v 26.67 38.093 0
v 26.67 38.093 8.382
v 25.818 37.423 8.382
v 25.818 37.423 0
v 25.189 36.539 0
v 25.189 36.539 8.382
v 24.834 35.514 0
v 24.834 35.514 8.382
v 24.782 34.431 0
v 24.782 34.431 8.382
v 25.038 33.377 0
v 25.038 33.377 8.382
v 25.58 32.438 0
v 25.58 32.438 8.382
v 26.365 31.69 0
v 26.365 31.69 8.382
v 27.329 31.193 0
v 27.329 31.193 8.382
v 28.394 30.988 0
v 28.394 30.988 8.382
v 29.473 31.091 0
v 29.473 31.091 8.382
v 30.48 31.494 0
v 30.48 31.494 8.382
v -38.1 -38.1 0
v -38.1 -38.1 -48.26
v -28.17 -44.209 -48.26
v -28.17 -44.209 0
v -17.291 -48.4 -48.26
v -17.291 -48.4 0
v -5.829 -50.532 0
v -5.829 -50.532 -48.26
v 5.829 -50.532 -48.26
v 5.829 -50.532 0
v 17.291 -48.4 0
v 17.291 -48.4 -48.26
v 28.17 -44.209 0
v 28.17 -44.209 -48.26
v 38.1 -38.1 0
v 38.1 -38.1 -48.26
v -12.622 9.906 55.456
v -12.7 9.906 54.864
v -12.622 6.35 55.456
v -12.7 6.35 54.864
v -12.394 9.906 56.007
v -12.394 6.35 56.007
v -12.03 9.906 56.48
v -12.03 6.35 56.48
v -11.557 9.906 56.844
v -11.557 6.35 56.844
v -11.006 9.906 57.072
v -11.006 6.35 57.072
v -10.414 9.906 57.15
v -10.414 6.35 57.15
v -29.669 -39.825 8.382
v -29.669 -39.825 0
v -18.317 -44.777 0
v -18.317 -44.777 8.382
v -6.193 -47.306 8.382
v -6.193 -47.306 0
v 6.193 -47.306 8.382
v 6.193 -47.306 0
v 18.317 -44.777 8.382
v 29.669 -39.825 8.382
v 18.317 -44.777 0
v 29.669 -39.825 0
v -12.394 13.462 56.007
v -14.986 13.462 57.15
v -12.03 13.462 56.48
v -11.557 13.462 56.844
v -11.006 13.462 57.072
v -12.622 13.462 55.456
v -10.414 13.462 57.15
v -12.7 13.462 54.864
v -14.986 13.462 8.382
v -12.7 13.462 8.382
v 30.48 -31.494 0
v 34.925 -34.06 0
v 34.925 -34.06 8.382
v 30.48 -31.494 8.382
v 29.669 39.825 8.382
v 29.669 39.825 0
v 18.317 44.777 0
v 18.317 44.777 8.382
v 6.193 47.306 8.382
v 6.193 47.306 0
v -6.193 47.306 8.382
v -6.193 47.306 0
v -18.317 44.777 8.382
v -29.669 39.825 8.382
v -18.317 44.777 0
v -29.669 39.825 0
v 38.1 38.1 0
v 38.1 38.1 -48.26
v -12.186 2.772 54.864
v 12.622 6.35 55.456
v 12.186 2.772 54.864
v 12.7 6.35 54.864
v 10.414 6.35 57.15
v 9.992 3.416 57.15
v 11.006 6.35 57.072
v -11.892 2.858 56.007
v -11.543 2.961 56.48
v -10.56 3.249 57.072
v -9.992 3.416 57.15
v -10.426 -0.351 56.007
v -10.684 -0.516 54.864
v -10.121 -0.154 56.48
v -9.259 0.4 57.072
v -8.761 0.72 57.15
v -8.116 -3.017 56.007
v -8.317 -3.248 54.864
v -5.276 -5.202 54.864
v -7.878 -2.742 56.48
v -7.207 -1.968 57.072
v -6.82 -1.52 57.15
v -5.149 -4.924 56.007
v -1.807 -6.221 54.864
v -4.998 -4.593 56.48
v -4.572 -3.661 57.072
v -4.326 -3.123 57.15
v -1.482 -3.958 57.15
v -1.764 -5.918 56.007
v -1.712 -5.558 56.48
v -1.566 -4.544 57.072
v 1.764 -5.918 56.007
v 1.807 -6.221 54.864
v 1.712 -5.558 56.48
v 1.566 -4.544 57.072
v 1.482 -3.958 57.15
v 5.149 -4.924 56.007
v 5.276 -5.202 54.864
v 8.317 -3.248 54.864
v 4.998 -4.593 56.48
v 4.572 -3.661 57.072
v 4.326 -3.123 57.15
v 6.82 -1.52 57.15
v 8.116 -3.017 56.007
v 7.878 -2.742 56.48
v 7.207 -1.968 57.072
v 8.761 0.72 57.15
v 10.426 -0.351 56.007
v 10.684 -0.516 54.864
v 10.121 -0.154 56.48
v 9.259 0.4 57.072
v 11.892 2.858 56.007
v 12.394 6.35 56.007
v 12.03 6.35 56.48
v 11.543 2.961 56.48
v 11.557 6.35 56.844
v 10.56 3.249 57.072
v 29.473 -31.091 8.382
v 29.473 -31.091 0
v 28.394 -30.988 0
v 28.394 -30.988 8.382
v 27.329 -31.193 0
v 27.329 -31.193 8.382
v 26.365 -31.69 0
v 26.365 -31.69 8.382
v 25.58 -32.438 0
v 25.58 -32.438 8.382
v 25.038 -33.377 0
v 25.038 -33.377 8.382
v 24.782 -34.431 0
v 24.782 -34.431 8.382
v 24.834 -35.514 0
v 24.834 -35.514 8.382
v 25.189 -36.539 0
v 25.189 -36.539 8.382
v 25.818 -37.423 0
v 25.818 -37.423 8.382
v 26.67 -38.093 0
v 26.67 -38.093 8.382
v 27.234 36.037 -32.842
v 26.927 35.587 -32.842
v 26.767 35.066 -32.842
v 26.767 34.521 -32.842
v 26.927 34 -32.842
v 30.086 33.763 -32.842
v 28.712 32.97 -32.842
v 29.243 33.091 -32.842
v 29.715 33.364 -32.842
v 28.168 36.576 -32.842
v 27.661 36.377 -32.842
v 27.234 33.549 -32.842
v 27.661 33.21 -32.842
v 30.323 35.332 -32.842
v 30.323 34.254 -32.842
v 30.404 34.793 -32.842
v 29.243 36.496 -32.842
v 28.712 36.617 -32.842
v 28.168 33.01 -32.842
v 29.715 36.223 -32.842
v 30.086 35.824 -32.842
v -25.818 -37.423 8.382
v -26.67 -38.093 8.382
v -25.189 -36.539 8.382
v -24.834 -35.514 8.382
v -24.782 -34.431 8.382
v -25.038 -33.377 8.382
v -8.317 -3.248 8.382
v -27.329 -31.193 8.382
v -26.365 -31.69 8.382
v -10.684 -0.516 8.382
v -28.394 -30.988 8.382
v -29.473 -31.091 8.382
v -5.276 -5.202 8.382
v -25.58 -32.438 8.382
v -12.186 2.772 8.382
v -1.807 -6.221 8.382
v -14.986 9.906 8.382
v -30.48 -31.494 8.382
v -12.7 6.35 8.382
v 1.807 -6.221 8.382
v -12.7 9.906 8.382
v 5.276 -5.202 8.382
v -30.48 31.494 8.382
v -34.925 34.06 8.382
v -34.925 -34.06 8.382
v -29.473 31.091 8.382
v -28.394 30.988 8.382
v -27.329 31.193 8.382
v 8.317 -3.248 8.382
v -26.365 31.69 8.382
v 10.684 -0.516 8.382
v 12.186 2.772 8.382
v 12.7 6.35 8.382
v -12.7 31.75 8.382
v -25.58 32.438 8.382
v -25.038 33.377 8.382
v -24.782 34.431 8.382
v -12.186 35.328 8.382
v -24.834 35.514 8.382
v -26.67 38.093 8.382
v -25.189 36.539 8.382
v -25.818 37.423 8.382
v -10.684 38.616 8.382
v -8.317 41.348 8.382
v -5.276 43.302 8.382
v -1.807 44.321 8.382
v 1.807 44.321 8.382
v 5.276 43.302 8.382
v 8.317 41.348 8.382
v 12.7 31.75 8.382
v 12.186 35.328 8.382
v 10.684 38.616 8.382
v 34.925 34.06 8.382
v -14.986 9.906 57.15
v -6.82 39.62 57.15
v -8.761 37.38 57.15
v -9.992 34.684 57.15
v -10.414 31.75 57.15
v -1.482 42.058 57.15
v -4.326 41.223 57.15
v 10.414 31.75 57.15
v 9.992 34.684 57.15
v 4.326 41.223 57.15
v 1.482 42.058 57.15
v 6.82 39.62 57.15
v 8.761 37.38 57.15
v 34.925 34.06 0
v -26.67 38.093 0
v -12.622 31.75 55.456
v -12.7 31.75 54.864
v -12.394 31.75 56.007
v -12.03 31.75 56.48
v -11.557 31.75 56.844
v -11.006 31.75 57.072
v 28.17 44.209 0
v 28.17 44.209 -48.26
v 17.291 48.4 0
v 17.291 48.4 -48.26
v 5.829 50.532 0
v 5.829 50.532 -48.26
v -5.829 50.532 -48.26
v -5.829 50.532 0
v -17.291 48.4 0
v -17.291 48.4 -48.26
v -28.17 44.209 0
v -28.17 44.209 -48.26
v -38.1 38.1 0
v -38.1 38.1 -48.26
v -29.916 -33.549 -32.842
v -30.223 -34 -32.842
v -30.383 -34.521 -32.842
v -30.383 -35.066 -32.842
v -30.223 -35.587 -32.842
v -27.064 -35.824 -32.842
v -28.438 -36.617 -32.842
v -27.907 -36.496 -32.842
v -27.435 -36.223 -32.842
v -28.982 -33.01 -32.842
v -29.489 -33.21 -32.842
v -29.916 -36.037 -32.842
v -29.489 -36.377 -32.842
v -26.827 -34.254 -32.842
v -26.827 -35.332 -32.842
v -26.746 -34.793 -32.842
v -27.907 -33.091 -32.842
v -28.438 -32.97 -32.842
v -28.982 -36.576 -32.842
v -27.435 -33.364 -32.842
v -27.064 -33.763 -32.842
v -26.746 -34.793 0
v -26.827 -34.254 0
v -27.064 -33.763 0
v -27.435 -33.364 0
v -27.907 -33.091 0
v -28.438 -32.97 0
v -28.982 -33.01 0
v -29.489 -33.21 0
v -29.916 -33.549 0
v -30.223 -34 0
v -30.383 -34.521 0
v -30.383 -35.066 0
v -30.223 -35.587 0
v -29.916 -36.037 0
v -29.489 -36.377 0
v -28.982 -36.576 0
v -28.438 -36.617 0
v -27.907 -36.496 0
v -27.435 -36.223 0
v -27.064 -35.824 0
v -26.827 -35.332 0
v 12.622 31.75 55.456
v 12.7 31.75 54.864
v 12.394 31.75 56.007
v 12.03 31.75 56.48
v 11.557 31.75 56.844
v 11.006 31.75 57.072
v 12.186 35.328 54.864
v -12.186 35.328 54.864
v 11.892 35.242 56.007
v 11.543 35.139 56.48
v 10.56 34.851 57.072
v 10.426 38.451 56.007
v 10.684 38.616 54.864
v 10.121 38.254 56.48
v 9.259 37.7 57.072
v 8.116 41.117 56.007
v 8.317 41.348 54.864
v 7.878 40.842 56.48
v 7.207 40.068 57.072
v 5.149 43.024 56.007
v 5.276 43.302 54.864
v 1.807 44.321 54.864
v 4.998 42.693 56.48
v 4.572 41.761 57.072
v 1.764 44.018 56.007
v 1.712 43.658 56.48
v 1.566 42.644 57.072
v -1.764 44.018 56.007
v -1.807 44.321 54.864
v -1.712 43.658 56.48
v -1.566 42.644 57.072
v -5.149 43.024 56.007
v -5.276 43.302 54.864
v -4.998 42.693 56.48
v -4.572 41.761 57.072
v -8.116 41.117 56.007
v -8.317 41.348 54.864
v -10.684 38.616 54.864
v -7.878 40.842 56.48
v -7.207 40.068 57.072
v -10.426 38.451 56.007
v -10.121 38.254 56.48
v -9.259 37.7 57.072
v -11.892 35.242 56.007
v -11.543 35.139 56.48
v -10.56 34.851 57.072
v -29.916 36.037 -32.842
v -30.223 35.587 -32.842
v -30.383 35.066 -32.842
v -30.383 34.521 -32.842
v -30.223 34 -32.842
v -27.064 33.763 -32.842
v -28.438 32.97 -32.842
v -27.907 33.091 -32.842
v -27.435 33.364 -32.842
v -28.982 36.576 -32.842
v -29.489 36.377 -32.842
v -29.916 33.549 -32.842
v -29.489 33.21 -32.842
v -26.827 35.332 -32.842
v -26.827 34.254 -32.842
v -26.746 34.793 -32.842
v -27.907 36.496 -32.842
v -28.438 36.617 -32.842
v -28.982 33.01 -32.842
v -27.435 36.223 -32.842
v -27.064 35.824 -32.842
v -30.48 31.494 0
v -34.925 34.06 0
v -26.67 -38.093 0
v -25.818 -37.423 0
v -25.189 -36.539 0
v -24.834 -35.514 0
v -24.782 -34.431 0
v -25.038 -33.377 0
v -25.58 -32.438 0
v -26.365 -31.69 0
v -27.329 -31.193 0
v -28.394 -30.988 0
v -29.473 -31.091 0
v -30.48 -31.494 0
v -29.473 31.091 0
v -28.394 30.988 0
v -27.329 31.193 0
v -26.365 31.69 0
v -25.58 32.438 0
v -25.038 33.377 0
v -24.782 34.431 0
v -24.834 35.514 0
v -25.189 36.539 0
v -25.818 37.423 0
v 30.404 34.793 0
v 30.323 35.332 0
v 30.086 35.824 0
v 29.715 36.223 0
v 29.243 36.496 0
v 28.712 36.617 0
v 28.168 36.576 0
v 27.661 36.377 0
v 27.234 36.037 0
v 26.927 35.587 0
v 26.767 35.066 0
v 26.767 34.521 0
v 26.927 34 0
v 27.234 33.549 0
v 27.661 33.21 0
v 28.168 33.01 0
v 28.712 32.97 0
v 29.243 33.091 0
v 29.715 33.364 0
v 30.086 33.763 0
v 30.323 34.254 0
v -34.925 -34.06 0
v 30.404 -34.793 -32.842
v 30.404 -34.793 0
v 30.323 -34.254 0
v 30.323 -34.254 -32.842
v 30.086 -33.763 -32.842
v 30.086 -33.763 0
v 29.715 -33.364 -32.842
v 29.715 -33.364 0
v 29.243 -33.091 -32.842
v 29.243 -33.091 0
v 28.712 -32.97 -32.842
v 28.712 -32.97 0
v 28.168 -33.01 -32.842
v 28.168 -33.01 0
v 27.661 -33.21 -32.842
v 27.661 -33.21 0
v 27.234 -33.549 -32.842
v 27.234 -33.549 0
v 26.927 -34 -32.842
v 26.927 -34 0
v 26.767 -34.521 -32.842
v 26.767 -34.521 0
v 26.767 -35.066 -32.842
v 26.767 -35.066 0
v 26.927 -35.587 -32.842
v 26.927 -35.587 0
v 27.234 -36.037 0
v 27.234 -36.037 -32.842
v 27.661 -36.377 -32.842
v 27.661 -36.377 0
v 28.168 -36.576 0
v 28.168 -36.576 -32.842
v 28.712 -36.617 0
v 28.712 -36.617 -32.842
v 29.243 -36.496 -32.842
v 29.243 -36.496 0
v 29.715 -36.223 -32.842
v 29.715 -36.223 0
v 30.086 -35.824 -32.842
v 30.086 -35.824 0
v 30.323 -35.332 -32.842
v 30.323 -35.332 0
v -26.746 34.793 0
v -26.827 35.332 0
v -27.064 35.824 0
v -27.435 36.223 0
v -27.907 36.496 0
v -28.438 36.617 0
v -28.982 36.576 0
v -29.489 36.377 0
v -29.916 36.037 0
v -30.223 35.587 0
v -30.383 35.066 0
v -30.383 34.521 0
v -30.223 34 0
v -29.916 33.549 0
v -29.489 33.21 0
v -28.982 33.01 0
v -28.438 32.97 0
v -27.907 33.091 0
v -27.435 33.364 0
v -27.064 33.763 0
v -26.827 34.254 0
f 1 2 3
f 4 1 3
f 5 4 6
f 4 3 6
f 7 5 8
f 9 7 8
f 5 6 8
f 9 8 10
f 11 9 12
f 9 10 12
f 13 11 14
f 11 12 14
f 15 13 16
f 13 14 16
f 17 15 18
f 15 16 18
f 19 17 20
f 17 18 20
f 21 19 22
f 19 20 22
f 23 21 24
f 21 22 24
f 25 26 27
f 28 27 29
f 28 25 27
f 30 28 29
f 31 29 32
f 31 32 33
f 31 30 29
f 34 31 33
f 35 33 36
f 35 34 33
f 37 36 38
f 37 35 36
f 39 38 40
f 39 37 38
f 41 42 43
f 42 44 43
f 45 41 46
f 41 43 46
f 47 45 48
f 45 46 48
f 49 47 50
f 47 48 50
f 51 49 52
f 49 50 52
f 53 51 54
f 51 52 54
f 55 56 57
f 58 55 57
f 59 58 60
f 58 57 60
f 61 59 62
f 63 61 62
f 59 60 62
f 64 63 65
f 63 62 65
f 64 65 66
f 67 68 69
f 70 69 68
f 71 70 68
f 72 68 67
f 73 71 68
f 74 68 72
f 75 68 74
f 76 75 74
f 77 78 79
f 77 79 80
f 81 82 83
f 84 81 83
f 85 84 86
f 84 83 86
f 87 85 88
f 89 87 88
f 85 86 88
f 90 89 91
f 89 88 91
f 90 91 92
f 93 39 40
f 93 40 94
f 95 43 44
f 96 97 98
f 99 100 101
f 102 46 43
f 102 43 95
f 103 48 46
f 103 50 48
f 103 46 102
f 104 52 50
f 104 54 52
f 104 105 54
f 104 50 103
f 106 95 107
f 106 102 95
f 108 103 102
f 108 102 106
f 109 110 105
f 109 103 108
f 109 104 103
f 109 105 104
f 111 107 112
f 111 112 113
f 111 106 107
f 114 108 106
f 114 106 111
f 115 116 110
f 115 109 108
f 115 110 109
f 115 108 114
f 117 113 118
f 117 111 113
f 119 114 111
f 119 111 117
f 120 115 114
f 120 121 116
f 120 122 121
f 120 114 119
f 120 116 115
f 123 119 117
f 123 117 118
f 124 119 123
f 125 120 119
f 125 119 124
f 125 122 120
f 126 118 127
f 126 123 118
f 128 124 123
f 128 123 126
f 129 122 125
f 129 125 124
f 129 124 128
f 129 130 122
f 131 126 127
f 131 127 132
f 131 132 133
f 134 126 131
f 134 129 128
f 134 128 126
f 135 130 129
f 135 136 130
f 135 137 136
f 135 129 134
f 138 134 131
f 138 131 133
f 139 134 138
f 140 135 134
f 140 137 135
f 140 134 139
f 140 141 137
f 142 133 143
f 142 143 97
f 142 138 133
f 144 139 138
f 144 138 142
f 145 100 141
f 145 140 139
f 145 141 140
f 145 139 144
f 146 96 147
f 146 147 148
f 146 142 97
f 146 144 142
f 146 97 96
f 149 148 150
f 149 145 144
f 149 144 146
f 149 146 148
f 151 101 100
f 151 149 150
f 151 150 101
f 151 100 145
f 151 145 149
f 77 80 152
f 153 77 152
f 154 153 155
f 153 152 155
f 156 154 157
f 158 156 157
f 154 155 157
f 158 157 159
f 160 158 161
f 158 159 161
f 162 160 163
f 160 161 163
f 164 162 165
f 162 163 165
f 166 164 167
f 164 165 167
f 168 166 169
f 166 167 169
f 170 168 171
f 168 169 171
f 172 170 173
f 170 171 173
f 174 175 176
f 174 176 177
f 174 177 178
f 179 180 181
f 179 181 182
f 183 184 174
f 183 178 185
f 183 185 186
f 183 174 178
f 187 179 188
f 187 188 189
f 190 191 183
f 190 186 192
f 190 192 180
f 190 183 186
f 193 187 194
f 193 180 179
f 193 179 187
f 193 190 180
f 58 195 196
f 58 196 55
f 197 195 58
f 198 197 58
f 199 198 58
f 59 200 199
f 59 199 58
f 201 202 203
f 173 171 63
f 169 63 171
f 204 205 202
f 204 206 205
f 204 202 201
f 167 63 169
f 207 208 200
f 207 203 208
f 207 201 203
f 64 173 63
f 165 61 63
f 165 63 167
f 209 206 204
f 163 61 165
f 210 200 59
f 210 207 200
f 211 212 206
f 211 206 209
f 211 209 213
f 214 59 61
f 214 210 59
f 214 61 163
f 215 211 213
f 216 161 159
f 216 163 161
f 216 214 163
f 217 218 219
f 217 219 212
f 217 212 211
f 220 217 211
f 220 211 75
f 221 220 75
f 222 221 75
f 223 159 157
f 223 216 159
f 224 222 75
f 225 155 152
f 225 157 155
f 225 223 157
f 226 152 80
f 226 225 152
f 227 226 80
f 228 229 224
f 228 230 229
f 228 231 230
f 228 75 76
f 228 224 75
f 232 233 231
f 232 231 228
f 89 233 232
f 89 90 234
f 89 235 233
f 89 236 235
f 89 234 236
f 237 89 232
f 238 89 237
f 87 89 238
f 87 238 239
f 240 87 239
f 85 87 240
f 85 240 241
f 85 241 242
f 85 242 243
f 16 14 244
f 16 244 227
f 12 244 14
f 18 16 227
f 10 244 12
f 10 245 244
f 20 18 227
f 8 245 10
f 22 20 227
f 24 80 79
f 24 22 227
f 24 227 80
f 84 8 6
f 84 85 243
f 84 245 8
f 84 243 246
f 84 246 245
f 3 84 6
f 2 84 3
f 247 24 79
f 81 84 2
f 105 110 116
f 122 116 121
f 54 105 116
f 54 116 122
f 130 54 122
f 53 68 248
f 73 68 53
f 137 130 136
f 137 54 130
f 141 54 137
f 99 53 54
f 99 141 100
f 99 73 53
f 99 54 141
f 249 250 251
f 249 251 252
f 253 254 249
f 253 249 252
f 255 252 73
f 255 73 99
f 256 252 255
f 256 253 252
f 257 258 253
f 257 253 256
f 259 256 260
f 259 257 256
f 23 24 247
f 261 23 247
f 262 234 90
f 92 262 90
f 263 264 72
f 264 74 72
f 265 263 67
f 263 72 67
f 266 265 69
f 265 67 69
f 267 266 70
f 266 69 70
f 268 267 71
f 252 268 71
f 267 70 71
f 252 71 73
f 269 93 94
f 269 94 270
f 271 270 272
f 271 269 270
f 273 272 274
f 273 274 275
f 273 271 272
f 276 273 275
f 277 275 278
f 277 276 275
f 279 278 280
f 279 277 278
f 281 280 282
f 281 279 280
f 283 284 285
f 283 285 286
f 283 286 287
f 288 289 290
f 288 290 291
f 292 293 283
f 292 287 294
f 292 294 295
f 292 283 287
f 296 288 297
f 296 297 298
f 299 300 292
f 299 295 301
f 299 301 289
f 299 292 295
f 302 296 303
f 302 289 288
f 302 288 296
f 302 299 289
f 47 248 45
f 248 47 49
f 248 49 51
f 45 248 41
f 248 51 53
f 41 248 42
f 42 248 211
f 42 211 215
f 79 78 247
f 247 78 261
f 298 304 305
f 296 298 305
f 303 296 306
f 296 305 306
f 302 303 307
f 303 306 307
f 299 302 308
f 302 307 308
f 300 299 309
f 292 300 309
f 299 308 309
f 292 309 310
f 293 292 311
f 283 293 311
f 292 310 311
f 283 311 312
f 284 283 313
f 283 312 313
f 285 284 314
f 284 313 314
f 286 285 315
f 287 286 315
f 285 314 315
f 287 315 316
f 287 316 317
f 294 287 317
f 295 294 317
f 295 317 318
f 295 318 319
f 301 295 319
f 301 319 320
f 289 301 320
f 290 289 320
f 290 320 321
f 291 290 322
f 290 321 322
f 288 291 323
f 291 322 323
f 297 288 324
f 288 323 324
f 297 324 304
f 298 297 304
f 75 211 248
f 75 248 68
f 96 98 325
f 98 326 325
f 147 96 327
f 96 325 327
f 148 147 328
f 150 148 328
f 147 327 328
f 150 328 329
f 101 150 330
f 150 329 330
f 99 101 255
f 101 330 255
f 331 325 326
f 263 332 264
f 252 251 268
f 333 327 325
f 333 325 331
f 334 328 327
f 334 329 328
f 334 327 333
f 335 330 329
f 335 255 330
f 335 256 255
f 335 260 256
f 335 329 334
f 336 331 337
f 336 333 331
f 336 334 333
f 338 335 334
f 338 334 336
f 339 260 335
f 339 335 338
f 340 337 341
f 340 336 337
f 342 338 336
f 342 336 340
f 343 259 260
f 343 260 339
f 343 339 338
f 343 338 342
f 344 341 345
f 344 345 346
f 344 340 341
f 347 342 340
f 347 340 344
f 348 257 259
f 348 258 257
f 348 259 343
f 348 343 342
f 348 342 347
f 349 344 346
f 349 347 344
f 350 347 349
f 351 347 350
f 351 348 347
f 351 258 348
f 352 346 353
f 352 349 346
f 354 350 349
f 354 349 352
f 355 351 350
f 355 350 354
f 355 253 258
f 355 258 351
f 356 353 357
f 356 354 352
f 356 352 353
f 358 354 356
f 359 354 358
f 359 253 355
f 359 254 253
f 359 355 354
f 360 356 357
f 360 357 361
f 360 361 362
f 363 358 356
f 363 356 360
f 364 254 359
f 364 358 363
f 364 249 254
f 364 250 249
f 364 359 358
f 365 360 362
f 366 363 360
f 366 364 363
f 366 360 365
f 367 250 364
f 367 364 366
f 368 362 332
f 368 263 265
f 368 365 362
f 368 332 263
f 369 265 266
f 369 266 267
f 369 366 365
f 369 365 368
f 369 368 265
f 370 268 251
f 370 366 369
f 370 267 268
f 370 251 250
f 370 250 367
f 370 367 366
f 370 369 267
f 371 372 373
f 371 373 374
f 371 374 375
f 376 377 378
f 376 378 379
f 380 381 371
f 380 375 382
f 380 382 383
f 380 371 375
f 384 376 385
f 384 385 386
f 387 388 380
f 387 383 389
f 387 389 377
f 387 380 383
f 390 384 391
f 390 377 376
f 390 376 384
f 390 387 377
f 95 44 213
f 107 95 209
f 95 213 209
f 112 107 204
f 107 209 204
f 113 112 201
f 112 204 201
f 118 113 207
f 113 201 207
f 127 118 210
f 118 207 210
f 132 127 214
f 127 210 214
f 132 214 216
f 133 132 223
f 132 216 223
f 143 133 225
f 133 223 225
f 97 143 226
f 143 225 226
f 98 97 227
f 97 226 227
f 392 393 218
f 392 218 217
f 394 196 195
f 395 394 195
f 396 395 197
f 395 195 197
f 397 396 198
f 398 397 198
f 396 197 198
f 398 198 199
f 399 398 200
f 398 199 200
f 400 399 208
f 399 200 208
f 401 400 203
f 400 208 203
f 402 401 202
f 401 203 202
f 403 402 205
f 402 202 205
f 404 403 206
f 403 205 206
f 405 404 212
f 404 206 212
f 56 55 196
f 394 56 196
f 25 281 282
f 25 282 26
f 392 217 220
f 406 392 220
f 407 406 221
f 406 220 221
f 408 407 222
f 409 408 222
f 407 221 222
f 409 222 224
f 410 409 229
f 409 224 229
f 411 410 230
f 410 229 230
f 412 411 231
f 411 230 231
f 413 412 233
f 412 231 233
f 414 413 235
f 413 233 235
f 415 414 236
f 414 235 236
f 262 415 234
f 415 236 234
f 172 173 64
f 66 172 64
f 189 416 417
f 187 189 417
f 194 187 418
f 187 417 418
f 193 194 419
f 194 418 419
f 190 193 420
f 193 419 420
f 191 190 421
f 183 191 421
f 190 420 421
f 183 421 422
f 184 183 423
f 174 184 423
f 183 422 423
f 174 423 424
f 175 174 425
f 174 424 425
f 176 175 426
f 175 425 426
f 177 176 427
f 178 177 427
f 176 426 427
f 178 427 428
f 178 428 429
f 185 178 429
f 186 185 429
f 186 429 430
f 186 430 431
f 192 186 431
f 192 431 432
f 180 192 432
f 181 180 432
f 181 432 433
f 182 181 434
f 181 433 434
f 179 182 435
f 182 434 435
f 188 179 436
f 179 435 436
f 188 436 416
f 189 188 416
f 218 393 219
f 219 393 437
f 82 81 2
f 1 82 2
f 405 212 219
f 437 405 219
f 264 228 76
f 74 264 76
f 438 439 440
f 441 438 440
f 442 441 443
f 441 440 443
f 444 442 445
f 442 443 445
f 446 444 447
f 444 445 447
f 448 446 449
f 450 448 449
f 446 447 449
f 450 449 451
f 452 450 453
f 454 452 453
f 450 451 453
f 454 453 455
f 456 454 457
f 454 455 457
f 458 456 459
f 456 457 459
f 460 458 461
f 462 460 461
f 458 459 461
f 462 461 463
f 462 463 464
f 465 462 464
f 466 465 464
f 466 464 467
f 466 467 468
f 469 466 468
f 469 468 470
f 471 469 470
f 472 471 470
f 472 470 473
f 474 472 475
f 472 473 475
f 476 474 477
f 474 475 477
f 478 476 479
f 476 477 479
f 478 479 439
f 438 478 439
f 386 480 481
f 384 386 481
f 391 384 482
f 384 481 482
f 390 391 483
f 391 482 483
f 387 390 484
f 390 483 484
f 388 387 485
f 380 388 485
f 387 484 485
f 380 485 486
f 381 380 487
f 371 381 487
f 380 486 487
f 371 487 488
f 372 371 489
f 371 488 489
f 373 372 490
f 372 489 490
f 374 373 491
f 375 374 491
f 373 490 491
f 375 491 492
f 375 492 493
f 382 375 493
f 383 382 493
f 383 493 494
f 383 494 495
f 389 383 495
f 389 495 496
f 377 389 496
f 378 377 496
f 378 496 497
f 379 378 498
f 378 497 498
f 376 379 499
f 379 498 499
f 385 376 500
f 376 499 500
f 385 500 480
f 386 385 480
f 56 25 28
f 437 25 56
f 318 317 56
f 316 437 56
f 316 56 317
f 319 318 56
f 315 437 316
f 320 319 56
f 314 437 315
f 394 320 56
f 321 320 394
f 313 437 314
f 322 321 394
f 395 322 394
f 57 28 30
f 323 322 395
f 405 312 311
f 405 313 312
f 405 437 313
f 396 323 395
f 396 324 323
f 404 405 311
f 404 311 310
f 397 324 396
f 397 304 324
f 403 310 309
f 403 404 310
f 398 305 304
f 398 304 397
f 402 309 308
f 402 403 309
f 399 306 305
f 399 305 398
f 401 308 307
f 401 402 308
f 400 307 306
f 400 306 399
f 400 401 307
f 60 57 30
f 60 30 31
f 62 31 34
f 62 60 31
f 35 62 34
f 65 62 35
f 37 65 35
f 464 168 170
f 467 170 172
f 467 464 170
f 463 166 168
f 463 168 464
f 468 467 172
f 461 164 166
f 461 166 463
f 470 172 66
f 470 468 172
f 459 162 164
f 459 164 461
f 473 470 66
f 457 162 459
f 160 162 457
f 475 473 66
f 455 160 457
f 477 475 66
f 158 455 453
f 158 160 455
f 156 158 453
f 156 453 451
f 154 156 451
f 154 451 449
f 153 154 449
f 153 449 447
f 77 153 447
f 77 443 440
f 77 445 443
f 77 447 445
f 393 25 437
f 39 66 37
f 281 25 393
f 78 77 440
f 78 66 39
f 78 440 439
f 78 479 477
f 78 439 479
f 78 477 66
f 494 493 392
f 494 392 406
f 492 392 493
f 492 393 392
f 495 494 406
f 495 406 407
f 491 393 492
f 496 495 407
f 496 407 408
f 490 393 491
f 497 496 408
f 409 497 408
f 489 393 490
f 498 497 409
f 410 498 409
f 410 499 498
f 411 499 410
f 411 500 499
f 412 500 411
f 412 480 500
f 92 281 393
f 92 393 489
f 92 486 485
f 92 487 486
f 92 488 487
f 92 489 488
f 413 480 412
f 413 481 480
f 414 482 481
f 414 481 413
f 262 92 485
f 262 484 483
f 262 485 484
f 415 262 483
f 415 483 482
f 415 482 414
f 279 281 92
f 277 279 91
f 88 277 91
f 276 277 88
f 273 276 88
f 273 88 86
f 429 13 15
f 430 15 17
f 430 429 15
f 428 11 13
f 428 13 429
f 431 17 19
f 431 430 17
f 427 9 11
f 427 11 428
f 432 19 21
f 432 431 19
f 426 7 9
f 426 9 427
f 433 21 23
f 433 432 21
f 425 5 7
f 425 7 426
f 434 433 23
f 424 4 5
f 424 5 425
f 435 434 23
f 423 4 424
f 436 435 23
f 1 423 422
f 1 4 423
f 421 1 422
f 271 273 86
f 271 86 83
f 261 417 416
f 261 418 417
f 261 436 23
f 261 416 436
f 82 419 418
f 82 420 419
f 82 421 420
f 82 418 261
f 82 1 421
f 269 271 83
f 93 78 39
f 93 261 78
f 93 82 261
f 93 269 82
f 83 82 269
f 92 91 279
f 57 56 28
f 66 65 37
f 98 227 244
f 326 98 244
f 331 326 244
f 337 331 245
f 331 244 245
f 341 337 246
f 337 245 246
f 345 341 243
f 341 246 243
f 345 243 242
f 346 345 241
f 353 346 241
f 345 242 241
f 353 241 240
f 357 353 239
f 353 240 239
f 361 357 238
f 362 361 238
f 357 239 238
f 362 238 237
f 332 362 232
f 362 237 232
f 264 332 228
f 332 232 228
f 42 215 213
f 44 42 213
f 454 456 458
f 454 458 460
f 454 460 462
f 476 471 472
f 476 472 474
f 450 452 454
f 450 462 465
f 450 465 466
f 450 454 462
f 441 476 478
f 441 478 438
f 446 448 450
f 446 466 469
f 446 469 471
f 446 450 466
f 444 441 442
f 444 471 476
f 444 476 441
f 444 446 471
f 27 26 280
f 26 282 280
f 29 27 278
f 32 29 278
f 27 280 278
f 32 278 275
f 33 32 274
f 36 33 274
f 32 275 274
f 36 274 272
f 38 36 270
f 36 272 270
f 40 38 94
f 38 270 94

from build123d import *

# Parameters (mm, degrees)
F1_DEPTH  = 48.26
F3_DEPTH  = 8.382
F5_DEPTH  = 8.382
F6_R      = 1.8288
F7_DEPTH  = 32.8422
F9_DEPTH  = 57.15
F10_W     = 2.286
F10_H     = 3.556
F11_DEPTH = 48.768
F12_R     = 2.286


with BuildPart() as f1:
    # F0 (on Top) → F1 (new body)
    with BuildSketch(Plane.XY):
        with BuildLine():
            ThreePointArc((-38.1, -38.1), (0, -50.8), (38.1, -38.1))
            Line((38.1, -38.1), (38.1, 38.1))
            ThreePointArc((38.1, 38.1), (0, 50.8), (-38.1, 38.1))
            Line((-38.1, 38.1), (-38.1, -38.1))
        make_face()
    extrude(amount=-F1_DEPTH)

    # F2 (on face) → F3 (join)
    with BuildSketch(Plane.XY):
        with BuildLine():
            Line((-34.925, 36.486888), (-34.925, -36.486888))
            ThreePointArc((-34.925, -36.486888), (0, -47.625), (34.925, -36.486888))
            Line((34.925, -36.486888), (34.925, 36.486888))
            ThreePointArc((34.925, 36.486888), (0, 47.625), (-34.925, 36.486888))
        make_face()
    extrude(amount=F3_DEPTH)

    # F4 (on face) → F5 (cut, through all)
    with BuildSketch(Plane.XY.offset(8.382)):
        with BuildLine():
            ThreePointArc((-26.67, -38.092896), (-25.275443, -32.88834), (-30.48, -31.493783))
            Line((-30.48, -31.493783), (-52.477045, -44.193783))
            ThreePointArc((-52.477045, -44.193783), (-53.871602, -49.39834), (-48.667045, -50.792896))
            Line((-48.667045, -50.792896), (-26.67, -38.092896))
        make_face()
        with BuildLine():
            ThreePointArc((30.48, -31.493783), (25.275443, -32.88834), (26.67, -38.092896))
            Line((26.67, -38.092896), (48.667045, -50.792896))
            ThreePointArc((48.667045, -50.792896), (53.871602, -49.39834), (52.477045, -44.193783))
            Line((52.477045, -44.193783), (30.48, -31.493783))
        make_face()
        with BuildLine():
            Line((-52.477045, 44.193783), (-30.48, 31.493783))
            ThreePointArc((-30.48, 31.493783), (-25.275443, 32.88834), (-26.67, 38.092896))
            Line((-26.67, 38.092896), (-48.667045, 50.792896))
            ThreePointArc((-48.667045, 50.792896), (-53.871602, 49.39834), (-52.477045, 44.193783))
        make_face()
        with BuildLine():
            ThreePointArc((26.67, 38.092896), (25.275443, 32.88834), (30.48, 31.493783))
            Line((30.48, 31.493783), (52.477045, 44.193783))
            ThreePointArc((52.477045, 44.193783), (53.871602, 49.39834), (48.667045, 50.792896))
            Line((48.667045, 50.792896), (26.67, 38.092896))
        make_face()
    extrude(amount=-F5_DEPTH, mode=Mode.SUBTRACT)

    # F6 (on face) → F7 (cut)
    with BuildSketch(Plane.XY):
        with Locations((28.575, -34.79334)):
            Circle(F6_R)
        with Locations((-28.575, -34.79334)):
            Circle(F6_R)
        with Locations((-28.575, 34.79334)):
            Circle(F6_R)
        with Locations((28.575, 34.79334)):
            Circle(F6_R)
    extrude(amount=-F7_DEPTH, mode=Mode.SUBTRACT)

    # F8 (on Top) → F9 (join)
    with BuildSketch(Plane.XY):
        with BuildLine():
            ThreePointArc((-12.7, 6.35), (0, -6.35), (12.7, 6.35))
            Line((12.7, 6.35), (12.7, 31.75))
            ThreePointArc((12.7, 31.75), (0, 44.45), (-12.7, 31.75))
            Line((-12.7, 31.75), (-12.7, 6.35))
        make_face()
    extrude(amount=F9_DEPTH)

    # F10 (on face) → F11 (join, through all)
    with BuildSketch(Plane.XY.offset(8.382)):
        with Locations((-13.843, 11.684)):
            Rectangle(F10_W, F10_H)
    extrude(amount=F11_DEPTH)

    # F12
    f12_edges = [f1.edges().sort_by_distance(p)[0] for p in [
        (12.7, 19.05, 57.15),
    ]]
    fillet(f12_edges, radius=F12_R)


solid = f1.part
